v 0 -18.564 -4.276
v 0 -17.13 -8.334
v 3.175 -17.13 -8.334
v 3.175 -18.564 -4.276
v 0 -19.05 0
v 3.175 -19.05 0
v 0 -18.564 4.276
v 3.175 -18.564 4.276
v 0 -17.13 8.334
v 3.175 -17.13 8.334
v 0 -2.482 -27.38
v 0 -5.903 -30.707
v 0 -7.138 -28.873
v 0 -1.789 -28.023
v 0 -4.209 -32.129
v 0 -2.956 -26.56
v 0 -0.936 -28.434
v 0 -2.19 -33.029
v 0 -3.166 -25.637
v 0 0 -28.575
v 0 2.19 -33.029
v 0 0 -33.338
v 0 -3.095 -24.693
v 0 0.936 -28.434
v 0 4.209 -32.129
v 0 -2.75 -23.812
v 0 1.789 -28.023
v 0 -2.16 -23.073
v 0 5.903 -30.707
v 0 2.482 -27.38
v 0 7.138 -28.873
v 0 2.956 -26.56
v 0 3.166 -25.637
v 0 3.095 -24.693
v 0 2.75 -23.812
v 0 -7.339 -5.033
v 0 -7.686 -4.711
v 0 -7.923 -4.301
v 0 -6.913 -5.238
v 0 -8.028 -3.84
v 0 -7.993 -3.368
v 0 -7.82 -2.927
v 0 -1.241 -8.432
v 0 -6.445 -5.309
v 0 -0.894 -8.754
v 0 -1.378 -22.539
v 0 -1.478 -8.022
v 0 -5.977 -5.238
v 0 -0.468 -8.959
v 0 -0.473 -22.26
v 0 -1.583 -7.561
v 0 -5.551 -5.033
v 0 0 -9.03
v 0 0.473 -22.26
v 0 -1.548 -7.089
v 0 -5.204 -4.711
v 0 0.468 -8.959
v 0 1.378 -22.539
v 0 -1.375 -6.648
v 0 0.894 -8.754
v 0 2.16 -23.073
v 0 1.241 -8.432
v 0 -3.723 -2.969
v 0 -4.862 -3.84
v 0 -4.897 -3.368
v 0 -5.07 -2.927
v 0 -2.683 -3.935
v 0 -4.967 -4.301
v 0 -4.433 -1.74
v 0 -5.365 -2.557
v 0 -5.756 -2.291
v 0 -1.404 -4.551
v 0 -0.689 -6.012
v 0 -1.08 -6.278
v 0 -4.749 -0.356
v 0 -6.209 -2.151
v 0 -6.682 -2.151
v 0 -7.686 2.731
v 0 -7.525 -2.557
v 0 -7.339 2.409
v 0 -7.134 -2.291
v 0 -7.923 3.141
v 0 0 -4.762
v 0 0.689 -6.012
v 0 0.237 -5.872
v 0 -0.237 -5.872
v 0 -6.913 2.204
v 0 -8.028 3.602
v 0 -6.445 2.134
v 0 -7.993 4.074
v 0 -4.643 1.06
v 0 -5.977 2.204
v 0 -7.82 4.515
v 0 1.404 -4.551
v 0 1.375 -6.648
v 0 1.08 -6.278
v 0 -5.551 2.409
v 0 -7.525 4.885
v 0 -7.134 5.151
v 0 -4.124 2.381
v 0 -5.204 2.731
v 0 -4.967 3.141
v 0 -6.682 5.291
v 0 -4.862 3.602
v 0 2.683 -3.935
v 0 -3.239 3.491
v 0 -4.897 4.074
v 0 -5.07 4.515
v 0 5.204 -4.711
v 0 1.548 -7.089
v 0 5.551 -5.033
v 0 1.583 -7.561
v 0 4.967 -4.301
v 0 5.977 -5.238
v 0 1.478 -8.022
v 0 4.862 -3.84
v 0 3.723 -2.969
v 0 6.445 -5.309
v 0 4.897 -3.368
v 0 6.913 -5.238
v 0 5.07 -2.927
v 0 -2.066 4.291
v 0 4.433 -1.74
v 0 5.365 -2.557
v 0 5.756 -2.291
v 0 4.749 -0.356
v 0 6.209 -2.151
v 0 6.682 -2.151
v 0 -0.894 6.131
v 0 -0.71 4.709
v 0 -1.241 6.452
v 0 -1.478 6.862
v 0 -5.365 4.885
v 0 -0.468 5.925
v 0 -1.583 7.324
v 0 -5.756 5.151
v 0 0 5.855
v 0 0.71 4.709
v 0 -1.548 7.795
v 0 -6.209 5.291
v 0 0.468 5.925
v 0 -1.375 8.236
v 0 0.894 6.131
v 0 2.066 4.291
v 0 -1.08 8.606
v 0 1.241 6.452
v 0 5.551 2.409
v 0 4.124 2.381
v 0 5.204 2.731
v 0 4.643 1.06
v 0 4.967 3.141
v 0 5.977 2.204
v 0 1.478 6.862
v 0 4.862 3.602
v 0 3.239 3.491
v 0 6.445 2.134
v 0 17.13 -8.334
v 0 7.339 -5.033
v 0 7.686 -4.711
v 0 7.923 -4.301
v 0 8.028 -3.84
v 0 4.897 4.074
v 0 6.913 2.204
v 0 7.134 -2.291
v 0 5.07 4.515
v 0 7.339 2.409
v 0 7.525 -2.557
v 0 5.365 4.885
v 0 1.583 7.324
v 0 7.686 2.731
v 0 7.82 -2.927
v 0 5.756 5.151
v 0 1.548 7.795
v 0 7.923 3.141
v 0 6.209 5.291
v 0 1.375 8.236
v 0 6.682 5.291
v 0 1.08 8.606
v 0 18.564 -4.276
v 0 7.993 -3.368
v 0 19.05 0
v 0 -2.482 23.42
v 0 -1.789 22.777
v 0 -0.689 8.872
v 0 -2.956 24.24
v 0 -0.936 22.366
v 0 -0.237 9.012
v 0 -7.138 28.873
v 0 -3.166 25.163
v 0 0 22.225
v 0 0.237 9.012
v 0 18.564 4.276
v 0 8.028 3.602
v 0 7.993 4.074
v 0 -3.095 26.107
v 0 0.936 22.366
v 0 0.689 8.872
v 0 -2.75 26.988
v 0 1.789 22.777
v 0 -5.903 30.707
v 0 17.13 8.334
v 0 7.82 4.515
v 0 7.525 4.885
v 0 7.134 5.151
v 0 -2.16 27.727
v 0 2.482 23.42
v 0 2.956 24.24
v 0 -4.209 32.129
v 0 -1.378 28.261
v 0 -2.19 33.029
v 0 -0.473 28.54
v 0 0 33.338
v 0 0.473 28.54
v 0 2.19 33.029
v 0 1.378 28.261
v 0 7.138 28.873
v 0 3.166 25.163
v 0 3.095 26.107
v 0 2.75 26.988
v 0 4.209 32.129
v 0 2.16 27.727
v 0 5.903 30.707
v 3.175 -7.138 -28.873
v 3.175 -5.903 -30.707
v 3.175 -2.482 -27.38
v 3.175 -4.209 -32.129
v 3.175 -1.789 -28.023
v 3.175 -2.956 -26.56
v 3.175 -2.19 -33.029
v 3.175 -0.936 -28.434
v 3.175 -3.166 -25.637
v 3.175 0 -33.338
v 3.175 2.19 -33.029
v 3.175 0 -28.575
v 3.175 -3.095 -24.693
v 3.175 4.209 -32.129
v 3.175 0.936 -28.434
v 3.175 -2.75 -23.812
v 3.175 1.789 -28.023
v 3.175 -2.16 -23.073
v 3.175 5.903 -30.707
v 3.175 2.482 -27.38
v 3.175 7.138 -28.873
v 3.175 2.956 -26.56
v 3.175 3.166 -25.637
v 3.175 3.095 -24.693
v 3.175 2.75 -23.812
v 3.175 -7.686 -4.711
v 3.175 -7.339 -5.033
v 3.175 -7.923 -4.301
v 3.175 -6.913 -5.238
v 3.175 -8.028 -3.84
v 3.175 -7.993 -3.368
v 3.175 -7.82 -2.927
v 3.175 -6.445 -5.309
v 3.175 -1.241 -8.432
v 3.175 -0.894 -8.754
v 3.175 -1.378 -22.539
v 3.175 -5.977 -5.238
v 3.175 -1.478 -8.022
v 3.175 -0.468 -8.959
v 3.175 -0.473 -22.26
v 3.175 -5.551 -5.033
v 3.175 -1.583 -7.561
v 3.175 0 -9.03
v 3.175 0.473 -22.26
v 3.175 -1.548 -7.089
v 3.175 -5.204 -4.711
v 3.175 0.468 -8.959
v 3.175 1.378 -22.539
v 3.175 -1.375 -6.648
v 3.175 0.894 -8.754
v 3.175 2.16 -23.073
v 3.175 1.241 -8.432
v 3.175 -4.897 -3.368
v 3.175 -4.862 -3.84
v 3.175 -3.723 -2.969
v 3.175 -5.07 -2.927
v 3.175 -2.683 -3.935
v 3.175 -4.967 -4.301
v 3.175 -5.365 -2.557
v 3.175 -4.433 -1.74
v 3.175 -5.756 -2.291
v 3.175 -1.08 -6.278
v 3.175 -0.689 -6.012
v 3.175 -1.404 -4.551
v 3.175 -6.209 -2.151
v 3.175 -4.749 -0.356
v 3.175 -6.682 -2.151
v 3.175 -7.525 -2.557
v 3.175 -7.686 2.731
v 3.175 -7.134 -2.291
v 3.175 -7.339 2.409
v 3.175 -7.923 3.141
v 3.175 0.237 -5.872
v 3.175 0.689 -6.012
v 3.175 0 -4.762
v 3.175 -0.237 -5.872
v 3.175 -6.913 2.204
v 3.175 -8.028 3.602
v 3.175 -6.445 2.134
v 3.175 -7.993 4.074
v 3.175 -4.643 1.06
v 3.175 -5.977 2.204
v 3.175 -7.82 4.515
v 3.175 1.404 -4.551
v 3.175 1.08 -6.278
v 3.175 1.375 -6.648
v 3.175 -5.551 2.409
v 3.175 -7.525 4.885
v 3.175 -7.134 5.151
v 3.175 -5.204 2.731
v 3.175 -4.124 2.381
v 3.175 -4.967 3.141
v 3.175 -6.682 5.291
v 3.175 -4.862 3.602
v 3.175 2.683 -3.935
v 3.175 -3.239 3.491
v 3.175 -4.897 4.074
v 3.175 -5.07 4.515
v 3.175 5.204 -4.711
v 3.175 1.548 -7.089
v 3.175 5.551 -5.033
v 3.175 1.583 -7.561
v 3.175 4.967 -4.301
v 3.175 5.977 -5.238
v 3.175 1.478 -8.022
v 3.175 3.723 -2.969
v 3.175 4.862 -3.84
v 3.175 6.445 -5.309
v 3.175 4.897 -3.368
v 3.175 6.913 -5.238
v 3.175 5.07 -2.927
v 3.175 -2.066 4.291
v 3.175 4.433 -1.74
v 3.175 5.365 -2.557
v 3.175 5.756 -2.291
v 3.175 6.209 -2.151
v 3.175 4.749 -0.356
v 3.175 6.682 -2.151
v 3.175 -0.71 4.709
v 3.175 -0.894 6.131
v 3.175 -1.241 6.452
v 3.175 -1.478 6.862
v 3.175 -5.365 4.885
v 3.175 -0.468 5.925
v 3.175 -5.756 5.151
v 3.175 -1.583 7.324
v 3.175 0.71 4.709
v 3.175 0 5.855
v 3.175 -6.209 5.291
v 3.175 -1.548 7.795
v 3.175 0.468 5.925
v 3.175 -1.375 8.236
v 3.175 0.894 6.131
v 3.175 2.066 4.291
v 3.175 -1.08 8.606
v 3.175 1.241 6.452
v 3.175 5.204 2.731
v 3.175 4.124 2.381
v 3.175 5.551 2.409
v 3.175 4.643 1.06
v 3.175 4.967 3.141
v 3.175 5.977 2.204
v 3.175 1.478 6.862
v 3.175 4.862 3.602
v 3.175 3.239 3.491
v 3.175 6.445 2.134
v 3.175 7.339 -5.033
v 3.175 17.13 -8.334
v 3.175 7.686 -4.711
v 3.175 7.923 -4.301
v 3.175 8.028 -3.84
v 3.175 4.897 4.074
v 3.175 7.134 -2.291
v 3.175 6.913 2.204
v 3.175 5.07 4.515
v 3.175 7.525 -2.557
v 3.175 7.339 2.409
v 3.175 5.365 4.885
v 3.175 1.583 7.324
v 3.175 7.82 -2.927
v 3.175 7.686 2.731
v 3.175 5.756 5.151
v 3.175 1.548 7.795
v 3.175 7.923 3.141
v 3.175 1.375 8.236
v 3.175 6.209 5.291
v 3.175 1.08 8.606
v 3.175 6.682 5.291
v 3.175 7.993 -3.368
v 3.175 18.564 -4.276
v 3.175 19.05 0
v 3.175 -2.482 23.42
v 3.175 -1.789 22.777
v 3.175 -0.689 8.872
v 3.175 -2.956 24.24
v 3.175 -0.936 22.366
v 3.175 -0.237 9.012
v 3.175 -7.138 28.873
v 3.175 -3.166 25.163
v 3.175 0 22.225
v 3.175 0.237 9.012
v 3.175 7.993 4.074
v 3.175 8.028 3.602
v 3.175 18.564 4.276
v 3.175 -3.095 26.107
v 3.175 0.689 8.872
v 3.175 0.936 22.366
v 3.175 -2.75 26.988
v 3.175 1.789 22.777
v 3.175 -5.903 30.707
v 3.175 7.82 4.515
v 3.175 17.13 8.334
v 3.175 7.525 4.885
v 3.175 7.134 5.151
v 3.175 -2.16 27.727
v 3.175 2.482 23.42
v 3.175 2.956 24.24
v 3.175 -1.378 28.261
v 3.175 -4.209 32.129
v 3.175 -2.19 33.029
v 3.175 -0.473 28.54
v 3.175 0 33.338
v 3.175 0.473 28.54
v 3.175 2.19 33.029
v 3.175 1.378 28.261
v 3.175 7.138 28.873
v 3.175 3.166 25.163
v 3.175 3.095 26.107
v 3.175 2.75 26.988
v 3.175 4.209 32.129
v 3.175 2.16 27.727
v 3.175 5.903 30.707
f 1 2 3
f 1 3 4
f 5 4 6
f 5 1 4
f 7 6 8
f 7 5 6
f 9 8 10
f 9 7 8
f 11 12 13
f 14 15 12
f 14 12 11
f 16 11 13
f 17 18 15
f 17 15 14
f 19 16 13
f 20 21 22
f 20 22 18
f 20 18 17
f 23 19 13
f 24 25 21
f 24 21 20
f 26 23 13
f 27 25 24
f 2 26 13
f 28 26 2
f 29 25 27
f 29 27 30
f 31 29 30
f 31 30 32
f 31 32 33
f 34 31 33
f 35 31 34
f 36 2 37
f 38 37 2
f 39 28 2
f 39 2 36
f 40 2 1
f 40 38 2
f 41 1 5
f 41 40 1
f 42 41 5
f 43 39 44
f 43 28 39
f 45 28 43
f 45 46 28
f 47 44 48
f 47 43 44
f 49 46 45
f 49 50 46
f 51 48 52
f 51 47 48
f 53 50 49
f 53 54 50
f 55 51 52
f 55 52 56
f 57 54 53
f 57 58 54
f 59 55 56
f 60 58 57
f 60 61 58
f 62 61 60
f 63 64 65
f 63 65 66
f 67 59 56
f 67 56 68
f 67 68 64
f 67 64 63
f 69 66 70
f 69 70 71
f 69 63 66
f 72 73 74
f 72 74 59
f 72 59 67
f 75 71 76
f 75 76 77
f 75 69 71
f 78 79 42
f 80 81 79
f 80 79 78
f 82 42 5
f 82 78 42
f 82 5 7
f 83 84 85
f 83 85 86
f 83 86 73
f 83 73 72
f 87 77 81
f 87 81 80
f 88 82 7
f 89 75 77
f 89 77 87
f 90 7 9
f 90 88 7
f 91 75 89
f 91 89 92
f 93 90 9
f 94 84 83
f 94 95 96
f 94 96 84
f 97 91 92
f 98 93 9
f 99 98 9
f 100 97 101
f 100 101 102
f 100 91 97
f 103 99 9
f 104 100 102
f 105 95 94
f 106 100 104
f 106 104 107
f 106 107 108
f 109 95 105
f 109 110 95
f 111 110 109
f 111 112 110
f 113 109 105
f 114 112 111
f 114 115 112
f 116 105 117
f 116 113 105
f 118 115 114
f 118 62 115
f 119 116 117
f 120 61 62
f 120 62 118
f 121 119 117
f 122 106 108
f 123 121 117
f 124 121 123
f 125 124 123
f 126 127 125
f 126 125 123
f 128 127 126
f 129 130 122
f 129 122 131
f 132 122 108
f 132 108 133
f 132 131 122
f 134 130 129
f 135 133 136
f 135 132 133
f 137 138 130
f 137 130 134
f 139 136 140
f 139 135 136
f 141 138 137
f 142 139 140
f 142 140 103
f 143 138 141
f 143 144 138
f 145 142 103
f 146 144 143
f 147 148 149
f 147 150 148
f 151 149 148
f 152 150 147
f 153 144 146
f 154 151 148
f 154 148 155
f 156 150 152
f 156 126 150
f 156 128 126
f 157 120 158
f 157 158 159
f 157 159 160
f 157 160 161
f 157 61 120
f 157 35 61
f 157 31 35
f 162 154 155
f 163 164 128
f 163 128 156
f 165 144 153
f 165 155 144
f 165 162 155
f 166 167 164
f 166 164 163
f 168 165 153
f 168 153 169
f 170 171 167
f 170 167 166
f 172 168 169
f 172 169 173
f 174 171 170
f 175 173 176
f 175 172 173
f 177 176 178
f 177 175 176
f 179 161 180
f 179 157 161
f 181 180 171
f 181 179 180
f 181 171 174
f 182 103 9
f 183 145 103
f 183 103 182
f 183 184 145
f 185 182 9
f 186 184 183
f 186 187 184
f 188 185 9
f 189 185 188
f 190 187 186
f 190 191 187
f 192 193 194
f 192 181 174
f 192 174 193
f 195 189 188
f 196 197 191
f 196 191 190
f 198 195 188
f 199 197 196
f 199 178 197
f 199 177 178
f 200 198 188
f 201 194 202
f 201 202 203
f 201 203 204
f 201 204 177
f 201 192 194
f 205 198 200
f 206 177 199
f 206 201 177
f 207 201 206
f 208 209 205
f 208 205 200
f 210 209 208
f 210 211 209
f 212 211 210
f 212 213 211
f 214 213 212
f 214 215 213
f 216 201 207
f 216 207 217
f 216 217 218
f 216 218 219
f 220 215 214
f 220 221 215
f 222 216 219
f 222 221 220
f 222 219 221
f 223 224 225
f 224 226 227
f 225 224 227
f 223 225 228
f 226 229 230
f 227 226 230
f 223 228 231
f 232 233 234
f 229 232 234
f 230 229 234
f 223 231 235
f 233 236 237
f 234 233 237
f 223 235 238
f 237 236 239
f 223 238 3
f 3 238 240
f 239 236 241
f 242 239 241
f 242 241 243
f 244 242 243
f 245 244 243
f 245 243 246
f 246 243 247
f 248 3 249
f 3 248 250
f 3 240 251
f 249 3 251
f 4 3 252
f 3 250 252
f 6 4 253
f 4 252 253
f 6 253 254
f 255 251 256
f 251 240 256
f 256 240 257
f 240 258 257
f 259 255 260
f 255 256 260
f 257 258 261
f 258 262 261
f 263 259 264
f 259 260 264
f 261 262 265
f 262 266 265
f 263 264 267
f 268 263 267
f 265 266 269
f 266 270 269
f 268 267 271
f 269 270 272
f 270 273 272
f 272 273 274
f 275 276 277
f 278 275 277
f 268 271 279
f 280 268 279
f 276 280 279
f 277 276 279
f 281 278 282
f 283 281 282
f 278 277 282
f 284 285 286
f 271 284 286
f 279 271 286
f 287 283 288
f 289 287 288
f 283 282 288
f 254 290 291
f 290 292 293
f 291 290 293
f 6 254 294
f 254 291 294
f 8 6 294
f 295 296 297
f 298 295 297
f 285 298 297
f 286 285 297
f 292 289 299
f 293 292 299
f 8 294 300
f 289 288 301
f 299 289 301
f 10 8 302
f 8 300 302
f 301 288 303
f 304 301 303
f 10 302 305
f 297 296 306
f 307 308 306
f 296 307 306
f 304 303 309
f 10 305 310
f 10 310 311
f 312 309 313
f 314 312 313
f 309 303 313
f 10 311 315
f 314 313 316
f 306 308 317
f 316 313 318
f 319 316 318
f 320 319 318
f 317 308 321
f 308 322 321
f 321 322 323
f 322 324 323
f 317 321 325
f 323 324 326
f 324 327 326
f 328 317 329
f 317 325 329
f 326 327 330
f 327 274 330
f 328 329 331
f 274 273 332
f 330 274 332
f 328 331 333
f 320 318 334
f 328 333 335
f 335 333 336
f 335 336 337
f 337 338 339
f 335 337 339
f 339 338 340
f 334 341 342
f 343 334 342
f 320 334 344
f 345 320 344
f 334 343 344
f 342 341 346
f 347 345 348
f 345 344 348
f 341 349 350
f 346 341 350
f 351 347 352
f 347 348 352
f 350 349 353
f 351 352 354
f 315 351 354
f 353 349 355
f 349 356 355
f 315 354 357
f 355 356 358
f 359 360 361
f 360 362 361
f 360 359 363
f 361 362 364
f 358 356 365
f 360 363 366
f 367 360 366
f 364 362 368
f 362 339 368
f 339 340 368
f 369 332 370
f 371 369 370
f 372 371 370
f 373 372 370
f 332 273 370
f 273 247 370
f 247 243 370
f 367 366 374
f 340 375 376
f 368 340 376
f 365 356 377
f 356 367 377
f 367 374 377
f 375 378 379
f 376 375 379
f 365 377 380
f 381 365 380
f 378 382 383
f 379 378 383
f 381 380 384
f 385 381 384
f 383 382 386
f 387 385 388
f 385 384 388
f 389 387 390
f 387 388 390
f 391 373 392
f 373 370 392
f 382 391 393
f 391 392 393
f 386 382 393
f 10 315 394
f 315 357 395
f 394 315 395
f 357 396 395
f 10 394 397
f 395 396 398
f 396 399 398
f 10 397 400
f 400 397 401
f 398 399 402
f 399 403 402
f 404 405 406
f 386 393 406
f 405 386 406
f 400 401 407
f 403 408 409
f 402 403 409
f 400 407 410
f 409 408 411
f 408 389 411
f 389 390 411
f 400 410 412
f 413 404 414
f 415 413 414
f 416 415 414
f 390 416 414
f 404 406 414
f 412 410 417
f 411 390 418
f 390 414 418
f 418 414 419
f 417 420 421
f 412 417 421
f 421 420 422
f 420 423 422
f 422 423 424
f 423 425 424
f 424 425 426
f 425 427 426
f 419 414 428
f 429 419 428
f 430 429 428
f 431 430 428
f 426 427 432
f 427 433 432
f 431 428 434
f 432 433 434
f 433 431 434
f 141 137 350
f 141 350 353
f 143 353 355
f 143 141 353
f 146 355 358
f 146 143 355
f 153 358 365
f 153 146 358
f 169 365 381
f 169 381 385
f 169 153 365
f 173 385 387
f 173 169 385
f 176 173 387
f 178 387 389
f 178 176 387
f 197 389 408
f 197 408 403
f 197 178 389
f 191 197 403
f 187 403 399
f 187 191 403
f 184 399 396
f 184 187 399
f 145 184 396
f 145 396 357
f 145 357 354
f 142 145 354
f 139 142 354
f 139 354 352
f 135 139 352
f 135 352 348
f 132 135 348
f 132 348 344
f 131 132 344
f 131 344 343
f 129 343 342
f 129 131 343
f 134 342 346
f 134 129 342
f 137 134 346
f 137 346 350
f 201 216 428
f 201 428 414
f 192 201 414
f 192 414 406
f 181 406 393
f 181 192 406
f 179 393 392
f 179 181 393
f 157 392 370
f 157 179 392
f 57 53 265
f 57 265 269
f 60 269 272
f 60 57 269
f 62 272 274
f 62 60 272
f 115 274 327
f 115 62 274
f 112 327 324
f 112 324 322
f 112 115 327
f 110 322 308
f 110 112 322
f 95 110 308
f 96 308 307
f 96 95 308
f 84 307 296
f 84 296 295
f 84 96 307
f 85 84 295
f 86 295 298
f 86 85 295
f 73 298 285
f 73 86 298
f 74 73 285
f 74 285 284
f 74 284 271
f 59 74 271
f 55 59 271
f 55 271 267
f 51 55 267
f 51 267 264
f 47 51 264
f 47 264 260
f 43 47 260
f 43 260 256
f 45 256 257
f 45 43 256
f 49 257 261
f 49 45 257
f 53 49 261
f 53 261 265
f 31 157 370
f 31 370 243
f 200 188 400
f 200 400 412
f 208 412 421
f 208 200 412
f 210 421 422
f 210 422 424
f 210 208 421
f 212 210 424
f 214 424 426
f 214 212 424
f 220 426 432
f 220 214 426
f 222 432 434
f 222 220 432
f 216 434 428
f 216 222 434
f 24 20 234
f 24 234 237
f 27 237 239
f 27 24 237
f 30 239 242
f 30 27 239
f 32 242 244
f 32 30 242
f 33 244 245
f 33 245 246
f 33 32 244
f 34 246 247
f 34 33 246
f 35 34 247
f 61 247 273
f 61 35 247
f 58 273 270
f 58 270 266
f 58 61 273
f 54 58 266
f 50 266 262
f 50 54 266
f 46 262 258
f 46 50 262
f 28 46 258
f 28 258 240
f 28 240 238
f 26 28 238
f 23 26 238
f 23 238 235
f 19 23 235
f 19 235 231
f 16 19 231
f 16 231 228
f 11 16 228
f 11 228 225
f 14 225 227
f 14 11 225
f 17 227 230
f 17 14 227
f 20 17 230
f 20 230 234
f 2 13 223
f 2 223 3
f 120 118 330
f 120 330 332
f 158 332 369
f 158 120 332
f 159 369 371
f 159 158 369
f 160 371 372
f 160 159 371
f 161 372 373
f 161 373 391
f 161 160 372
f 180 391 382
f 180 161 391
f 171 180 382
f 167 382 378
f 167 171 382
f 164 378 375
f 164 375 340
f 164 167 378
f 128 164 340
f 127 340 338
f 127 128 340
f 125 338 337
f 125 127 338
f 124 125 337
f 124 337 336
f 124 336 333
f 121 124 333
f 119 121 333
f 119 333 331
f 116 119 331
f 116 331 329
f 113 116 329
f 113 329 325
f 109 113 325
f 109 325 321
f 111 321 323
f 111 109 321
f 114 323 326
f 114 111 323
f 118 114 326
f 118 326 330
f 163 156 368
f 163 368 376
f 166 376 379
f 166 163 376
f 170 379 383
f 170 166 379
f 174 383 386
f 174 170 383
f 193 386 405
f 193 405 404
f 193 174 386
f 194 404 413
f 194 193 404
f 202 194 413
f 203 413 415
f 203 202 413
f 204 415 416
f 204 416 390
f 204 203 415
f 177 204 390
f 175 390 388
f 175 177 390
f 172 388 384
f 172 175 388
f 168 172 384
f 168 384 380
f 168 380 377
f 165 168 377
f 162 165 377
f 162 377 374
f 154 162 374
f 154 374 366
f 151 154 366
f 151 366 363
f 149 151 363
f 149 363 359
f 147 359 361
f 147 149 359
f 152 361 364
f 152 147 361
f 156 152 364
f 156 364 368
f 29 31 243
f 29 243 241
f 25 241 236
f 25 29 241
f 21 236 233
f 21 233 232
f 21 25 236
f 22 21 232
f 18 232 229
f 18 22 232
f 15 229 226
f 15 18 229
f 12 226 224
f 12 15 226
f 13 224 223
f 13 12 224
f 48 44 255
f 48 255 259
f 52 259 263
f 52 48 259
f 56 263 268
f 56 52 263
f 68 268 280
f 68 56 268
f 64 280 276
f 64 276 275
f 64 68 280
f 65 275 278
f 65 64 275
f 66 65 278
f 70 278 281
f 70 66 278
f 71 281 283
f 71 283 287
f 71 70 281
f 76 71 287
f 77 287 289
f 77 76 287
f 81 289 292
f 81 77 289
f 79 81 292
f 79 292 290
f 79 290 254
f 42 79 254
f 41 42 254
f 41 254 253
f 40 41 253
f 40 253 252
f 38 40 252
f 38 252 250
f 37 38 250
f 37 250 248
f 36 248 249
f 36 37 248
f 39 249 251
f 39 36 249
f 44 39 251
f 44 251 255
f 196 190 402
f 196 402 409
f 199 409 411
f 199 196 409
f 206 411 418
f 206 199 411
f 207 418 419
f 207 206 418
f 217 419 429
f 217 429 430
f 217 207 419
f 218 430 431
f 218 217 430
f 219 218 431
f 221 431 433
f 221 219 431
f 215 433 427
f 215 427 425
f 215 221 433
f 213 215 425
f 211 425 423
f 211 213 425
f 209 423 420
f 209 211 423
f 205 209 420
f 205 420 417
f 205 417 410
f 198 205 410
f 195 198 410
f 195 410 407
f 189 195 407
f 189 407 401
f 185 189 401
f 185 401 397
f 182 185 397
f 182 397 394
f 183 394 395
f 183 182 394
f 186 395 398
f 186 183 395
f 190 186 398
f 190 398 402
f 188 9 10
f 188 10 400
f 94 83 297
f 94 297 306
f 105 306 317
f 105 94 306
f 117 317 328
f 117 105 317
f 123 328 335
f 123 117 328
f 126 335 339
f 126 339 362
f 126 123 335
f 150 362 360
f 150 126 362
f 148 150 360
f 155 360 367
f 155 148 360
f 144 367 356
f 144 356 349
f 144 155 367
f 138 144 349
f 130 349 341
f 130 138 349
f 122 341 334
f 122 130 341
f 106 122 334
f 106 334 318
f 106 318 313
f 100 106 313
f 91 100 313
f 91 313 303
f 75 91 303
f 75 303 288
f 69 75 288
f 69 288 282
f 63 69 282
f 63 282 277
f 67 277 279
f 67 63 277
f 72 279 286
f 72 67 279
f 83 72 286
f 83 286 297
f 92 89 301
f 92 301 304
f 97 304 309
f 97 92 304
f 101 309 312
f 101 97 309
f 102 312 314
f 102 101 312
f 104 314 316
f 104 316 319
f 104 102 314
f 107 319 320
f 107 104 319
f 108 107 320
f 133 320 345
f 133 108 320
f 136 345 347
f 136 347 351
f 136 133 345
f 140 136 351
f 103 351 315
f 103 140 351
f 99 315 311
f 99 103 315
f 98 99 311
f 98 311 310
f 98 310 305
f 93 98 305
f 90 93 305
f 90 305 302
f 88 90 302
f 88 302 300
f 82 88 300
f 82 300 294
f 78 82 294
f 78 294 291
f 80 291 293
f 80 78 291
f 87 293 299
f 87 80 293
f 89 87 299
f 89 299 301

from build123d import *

# Parameters (mm, degrees)
SKETCH1_R           = 4.7625
SKETCH1_R_2         = 3.175
SKETCH1_R_3         = 1.5875
BOSS_EXTRUDE1_DEPTH = 3.175


with BuildPart() as part:
    # Sketch1 → Boss-Extrude1 (new body)
    with BuildSketch(Plane(origin=(0, 0, 0), x_dir=(0, 0, -1), z_dir=(1, 0, 0))):
        with BuildLine():
            Line((-28.87265625, 7.137546134), (-8.334375, 17.130110722))
            ThreePointArc((-8.334375, 17.130110722), (0, 19.05), (8.334375, 17.130110722))
            Line((8.334375, 17.130110722), (28.87265625, 7.137546134))
            ThreePointArc((28.87265625, 7.137546134), (33.3375, 0), (28.87265625, -7.137546134))
            Line((28.87265625, -7.137546134), (8.334375, -17.130110722))
            ThreePointArc((8.334375, -17.130110722), (0, -19.05), (-8.334375, -17.130110722))
            Line((-8.334375, -17.130110722), (-28.87265625, -7.137546134))
            ThreePointArc((-28.87265625, -7.137546134), (-33.3375, 0), (-28.87265625, 7.137546134))
        make_face()
        Circle(SKETCH1_R, mode=Mode.SUBTRACT)
        with Locations((-25.4, 0)):
            Circle(SKETCH1_R_2, mode=Mode.SUBTRACT)
        with Locations((25.4, 0)):
            Circle(SKETCH1_R_2, mode=Mode.SUBTRACT)
        with Locations((-3.7211, -6.44513426)):
            Circle(SKETCH1_R_3, mode=Mode.SUBTRACT)
        with Locations((3.7211, 6.44513426)):
            Circle(SKETCH1_R_3, mode=Mode.SUBTRACT)
        with Locations((3.7211, -6.44513426)):
            Circle(SKETCH1_R_3, mode=Mode.SUBTRACT)
        with Locations((-3.7211, 6.44513426)):
            Circle(SKETCH1_R_3, mode=Mode.SUBTRACT)
        with Locations((-7.4422, 0)):
            Circle(SKETCH1_R_3, mode=Mode.SUBTRACT)
        with Locations((7.4422, 0)):
            Circle(SKETCH1_R_3, mode=Mode.SUBTRACT)
    extrude(amount=BOSS_EXTRUDE1_DEPTH)


solid = part.part
